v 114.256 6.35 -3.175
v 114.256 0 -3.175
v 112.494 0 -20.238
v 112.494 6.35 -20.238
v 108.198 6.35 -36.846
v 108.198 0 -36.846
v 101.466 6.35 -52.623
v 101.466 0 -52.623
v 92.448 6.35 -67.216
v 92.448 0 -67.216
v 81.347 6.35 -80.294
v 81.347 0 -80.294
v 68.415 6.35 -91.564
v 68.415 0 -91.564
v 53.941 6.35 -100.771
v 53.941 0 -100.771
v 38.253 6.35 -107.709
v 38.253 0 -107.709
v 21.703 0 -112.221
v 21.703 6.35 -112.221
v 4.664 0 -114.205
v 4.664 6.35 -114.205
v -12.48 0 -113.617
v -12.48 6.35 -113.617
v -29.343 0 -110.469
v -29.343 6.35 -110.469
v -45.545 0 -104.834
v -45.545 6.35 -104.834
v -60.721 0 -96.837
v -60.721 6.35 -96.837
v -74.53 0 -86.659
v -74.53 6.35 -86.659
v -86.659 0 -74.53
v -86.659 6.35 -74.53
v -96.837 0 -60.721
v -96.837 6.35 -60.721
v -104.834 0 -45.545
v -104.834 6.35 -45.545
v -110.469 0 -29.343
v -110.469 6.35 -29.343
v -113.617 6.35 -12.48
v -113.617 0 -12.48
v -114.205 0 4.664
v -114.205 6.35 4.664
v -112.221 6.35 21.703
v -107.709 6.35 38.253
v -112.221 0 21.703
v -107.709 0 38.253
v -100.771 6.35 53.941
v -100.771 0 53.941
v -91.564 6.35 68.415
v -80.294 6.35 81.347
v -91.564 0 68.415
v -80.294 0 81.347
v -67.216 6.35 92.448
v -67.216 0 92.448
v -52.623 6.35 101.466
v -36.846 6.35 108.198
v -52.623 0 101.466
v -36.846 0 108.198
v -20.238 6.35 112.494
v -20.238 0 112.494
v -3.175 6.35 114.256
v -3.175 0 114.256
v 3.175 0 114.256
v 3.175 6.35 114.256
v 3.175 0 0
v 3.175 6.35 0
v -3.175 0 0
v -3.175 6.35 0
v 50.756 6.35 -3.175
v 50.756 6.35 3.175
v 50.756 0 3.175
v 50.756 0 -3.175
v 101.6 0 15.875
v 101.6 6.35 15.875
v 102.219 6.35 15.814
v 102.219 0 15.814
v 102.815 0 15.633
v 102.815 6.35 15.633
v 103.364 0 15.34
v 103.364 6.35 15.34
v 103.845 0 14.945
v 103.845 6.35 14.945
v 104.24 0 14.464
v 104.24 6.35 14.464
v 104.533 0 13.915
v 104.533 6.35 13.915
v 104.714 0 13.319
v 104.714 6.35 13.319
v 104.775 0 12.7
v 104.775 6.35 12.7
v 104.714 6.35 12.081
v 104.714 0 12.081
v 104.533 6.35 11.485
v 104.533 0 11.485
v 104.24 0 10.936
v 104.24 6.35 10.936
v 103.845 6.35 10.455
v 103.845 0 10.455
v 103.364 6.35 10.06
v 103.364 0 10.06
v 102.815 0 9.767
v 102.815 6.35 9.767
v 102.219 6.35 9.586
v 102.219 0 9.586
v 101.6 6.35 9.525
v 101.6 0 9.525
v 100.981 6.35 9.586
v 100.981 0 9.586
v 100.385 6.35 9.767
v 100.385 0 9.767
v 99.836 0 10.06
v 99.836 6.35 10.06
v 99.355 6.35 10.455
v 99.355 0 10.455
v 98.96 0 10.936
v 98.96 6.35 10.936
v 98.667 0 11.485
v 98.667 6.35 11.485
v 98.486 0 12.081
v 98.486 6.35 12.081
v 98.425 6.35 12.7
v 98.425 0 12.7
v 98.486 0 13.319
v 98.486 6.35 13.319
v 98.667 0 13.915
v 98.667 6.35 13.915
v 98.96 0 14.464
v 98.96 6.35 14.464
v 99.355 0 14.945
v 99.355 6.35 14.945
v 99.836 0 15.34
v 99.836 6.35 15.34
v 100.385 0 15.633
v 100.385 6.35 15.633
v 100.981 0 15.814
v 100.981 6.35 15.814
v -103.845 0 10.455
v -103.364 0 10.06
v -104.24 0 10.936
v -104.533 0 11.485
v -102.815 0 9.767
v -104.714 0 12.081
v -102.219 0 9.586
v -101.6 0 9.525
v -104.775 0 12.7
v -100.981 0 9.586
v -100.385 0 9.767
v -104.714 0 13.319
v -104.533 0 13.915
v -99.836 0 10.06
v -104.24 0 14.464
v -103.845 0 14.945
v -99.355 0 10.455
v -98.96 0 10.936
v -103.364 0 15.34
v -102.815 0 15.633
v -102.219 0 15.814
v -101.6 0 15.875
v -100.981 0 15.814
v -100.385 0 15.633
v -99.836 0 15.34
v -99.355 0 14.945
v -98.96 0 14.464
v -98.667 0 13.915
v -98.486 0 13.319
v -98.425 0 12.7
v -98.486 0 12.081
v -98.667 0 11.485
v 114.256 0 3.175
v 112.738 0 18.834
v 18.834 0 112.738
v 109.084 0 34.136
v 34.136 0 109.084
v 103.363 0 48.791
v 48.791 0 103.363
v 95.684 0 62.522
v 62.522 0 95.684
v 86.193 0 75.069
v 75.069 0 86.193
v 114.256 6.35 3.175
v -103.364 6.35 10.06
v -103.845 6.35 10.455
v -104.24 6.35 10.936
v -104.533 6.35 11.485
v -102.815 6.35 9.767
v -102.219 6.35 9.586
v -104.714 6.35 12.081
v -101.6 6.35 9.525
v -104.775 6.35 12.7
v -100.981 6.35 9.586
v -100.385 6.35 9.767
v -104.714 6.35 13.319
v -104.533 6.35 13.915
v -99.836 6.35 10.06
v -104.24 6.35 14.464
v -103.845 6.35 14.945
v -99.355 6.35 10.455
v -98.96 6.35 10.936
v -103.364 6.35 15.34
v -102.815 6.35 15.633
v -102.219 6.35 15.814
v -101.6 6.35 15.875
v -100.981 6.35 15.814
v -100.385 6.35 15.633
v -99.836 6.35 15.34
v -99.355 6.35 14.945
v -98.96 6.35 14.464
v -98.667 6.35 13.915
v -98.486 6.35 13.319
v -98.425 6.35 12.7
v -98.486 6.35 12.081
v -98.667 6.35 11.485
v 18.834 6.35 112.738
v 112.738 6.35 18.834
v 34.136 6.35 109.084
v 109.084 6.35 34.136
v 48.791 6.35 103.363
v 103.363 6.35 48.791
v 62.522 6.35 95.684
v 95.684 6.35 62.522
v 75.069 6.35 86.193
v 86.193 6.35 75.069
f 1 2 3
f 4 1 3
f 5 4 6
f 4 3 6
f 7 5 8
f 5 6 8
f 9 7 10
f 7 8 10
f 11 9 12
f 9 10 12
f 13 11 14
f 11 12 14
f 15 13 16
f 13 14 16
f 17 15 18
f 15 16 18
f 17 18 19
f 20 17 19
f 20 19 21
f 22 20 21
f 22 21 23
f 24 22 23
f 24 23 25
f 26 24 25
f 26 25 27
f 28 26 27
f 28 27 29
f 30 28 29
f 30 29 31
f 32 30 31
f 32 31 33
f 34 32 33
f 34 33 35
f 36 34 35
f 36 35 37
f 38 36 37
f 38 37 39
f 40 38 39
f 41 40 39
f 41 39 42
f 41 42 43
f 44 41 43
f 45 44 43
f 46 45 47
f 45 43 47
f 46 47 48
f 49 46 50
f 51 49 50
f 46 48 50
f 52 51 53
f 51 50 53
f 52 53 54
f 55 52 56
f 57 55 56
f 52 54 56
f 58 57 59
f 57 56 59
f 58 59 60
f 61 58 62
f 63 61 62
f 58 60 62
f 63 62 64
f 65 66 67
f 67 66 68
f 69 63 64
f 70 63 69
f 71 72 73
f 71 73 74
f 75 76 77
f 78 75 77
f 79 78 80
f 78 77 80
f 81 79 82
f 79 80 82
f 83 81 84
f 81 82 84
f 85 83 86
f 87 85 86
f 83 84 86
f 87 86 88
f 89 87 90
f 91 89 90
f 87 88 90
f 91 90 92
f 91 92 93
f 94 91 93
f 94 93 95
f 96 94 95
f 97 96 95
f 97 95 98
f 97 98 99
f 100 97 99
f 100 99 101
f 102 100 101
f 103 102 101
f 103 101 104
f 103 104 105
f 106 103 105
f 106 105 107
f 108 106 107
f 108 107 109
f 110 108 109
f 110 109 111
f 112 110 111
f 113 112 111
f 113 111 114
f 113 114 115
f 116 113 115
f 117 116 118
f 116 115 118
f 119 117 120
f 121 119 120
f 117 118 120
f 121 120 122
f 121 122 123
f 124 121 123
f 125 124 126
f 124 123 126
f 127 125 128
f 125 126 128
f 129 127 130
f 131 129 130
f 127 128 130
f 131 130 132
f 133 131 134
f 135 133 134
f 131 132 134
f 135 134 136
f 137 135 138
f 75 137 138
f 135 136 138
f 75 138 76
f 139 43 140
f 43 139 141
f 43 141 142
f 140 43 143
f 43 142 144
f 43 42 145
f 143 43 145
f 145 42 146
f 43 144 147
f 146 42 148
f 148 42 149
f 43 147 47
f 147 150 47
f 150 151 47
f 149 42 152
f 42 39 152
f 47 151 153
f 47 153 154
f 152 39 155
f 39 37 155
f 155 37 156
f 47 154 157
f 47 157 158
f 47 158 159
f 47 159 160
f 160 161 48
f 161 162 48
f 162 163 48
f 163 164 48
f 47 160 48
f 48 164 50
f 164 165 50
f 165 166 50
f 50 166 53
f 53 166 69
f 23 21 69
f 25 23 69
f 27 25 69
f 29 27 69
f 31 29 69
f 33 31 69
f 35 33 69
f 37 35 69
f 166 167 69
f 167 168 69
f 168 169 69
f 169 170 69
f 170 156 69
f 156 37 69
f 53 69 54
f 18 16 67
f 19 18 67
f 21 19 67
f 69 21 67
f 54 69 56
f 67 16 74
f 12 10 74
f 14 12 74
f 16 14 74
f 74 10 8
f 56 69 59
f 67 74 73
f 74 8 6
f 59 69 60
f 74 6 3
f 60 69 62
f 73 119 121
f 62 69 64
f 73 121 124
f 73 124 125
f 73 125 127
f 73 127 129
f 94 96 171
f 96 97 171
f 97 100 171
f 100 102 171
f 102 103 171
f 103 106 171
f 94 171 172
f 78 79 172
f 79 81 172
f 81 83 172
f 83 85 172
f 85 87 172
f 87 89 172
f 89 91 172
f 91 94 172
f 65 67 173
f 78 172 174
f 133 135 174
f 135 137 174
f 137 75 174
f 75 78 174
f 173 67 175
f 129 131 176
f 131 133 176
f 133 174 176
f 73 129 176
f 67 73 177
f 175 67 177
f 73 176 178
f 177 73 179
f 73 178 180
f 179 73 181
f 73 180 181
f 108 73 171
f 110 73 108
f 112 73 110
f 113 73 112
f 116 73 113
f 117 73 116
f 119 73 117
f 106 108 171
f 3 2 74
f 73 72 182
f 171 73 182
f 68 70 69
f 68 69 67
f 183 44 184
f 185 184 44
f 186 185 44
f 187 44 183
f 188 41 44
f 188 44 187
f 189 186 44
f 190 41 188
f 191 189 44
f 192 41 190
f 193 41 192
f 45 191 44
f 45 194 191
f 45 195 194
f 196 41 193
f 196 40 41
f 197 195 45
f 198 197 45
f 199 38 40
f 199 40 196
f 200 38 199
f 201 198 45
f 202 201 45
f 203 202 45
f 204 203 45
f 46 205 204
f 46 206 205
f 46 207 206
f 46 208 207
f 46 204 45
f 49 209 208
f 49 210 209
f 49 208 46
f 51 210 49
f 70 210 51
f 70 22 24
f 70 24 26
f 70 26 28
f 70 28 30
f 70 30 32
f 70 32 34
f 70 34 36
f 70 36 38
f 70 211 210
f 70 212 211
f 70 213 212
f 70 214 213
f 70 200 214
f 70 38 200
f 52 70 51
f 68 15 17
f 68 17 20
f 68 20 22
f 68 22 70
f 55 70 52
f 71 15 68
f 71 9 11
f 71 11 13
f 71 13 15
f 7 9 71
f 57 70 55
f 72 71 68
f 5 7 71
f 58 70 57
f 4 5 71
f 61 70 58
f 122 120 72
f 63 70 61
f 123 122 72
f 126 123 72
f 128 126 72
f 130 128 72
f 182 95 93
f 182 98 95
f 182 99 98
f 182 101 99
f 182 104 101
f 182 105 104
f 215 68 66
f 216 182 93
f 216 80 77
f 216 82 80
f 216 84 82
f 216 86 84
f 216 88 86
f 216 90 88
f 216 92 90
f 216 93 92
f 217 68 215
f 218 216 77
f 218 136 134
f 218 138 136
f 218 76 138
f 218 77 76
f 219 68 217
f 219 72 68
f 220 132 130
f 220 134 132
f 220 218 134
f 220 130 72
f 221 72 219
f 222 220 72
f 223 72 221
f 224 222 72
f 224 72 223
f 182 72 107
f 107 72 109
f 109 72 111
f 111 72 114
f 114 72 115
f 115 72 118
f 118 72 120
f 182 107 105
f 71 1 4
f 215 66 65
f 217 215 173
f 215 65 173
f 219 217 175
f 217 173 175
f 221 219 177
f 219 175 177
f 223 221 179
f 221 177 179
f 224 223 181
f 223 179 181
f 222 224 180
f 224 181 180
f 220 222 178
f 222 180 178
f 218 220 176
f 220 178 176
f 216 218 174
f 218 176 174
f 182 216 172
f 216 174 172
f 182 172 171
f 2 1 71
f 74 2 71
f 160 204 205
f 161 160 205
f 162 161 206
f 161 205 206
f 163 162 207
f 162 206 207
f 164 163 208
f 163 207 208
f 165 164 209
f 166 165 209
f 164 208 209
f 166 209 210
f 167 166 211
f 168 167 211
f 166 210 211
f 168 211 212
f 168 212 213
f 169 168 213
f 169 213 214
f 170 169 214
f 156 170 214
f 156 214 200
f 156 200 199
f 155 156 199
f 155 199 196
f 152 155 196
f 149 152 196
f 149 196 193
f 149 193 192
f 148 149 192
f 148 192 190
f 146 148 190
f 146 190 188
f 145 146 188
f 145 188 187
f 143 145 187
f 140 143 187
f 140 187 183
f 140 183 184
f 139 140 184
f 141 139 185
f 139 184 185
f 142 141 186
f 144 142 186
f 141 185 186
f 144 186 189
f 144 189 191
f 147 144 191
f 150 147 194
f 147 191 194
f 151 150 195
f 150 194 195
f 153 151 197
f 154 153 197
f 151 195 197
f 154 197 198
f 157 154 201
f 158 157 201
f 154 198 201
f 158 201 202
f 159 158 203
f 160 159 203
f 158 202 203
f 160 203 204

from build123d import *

# Parameters (mm, degrees)
SKETCH1_R           = 114.3
BOSS_EXTRUDE1_DEPTH = 6.35
SKETCH2_W           = 6.35
SKETCH2_H           = 114.3
CUT_EXTRUDE1_DEPTH  = 6.35
CUT_EXTRUDE2_DEPTH  = 162.769287876
SKETCH4_R           = 3.175
CUT_EXTRUDE3_DEPTH  = 162.769287876


with BuildPart() as part:
    # Sketch1 → Boss-Extrude1 (new body)
    with BuildSketch(Plane(origin=(0, 0, 0), x_dir=(1, 0, 0), z_dir=(0, 1, 0))):
        with Locations(Location((0, 0, 0), (0, 0, 270))):
            Circle(SKETCH1_R)
    extrude(amount=BOSS_EXTRUDE1_DEPTH)

    # Sketch2 → Cut-Extrude1 (cut)
    with BuildSketch(Plane(origin=(0, 6.35, 0), x_dir=(1, 0, 0), z_dir=(0, 1, 0))):
        with Locations((0, -57.15)):
            Rectangle(SKETCH2_W, SKETCH2_H)
    extrude(amount=-CUT_EXTRUDE1_DEPTH, mode=Mode.SUBTRACT)

    # Sketch3 → Cut-Extrude2 (cut, through all)
    with BuildSketch(Plane(origin=(0, 6.35, 0), x_dir=(1, 0, 0), z_dir=(0, 1, 0))):
        Polygon((114.255894268, 3.175), (120.605894268, 3.175), (120.605894268, -3.175), (114.255894268, -3.175), (50.755894268, -3.175), (50.755894268, 3.175), align=None)
    extrude(amount=-CUT_EXTRUDE2_DEPTH, mode=Mode.SUBTRACT)

    # Sketch4 → Cut-Extrude3 (cut, through all)
    with BuildSketch(Plane(origin=(0, 6.35, 0), x_dir=(1, 0, 0), z_dir=(0, 1, 0))):
        with Locations(Location((101.6, -12.7, 0), (0, 0, 270))):
            Circle(SKETCH4_R)
        with Locations(Location((-101.6, -12.7, 0), (0, 0, 270))):
            Circle(SKETCH4_R)
    extrude(amount=-CUT_EXTRUDE3_DEPTH, mode=Mode.SUBTRACT)


solid = part.part
